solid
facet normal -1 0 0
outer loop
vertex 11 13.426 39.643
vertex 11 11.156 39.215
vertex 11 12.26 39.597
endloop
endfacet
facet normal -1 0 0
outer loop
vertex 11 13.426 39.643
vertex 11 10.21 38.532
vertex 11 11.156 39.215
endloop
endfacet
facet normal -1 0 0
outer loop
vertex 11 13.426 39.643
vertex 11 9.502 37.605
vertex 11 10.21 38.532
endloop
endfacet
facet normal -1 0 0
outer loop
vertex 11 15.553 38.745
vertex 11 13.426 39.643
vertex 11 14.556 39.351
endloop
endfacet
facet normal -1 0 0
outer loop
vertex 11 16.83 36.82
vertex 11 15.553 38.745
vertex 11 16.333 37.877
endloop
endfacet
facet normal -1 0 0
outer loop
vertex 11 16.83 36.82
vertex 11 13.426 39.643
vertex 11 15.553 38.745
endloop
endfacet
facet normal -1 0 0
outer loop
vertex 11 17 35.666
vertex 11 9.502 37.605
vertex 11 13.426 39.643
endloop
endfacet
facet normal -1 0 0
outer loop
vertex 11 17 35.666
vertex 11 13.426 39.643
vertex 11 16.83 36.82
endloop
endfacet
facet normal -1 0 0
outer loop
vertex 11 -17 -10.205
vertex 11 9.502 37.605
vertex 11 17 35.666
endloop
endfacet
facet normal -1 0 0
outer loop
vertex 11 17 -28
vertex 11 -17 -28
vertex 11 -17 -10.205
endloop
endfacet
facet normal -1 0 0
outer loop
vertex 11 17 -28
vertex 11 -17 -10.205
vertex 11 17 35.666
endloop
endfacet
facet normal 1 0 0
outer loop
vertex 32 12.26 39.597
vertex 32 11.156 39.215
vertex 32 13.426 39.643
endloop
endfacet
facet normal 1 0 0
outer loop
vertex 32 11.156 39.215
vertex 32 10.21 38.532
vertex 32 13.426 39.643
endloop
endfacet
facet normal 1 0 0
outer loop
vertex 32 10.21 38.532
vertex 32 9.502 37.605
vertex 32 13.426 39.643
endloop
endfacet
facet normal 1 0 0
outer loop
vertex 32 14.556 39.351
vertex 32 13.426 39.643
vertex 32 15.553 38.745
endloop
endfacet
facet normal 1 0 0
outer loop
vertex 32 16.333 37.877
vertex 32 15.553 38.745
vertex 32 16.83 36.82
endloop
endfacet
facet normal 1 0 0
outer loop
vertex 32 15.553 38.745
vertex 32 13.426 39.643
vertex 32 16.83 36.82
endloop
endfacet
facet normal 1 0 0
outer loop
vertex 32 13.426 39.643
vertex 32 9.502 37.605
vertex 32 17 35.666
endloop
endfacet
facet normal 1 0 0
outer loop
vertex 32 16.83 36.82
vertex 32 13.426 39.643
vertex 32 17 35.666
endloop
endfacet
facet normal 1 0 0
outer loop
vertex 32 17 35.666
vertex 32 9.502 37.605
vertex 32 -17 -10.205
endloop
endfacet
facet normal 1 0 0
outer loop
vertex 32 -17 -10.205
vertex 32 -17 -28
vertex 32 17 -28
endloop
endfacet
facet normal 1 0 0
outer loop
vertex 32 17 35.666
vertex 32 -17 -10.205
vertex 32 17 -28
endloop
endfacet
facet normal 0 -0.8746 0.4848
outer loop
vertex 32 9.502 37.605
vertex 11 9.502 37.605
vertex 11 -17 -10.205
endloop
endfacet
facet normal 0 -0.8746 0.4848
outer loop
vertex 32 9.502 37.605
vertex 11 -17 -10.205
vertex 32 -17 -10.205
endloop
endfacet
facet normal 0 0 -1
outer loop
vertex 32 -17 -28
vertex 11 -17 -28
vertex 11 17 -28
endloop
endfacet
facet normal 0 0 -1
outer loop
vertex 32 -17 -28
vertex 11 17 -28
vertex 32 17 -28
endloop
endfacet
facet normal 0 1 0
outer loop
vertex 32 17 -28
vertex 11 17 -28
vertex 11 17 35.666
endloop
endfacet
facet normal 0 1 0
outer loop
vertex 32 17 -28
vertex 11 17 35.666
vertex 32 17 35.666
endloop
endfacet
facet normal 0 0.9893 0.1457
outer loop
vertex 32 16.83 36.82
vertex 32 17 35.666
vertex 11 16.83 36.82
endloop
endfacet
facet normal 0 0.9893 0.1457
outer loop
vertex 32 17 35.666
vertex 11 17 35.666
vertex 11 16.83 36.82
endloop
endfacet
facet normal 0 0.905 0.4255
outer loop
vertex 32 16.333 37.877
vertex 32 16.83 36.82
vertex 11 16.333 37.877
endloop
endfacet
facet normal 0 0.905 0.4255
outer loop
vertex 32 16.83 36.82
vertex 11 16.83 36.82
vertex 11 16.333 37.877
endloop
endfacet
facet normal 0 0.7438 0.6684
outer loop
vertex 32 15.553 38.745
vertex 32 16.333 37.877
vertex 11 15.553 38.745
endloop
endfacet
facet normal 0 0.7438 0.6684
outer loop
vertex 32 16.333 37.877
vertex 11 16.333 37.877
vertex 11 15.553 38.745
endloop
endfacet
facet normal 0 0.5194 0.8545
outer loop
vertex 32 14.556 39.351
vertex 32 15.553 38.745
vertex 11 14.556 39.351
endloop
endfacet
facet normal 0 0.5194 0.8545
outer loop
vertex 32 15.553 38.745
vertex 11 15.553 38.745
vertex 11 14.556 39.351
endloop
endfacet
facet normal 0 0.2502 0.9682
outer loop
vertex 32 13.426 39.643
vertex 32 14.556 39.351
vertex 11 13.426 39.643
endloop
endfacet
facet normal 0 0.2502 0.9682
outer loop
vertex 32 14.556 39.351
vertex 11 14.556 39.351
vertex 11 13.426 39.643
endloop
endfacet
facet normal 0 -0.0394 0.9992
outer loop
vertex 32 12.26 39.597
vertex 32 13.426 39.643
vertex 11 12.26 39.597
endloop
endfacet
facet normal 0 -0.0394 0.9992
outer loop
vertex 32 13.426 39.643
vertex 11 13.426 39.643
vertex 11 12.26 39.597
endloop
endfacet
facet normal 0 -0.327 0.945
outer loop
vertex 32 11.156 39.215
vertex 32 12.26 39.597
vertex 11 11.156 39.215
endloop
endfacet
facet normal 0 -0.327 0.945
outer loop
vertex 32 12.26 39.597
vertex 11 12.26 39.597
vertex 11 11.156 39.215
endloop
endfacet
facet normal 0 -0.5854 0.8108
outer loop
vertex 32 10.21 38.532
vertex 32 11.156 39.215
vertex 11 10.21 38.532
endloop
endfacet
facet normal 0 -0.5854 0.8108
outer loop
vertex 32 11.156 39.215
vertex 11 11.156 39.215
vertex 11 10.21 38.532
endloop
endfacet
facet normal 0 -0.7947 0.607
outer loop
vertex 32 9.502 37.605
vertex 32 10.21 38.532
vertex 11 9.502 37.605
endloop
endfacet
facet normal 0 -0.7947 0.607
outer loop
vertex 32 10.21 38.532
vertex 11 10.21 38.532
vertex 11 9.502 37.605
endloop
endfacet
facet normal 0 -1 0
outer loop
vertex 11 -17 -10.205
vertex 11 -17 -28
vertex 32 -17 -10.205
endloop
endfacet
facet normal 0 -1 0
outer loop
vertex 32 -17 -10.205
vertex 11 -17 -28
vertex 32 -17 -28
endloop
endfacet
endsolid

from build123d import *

# Parameters (mm, degrees)
BOX112015002006_W          = 23
BOX112015002006_H          = 34
BOX112015002006_DEPTH      = 80
BOX112015002006_ROLL_ANGLE = -29
BOX112015002005_W          = 21
BOX112015002005_H          = 34
BOX112015002005_DEPTH      = 80
FILLET002_R                = 4


with BuildPart() as cube076:
    # Box112015002006 → Box112015002006 (new body)
    with BuildSketch(Plane.XY):
        with Locations((11.5, 17)):
            Rectangle(BOX112015002006_W, BOX112015002006_H)
    extrude(amount=BOX112015002006_DEPTH)


with BuildPart() as cube076_1:
    # Box112015002006 roll: moved
    add(cube076.part.rotate(Axis((0, 0, 0), (1, 0, 0)), BOX112015002006_ROLL_ANGLE))


with BuildPart() as cube076_2:
    # Box112015002006 placement: moved
    add(cube076_1.part.moved(Location((10, -48, -6))))


with BuildPart() as fillet002:
    # Box112015002005 → Box112015002005 (new body)
    with BuildSketch(Plane(origin=(11, -17, -38), x_dir=(1, 0, 0), z_dir=(0, 0, 1))):
        with Locations((10.5, 17)):
            Rectangle(BOX112015002005_W, BOX112015002005_H)
    extrude(amount=BOX112015002005_DEPTH)

    # Cut131: cut Cube076
    add(cube076_2.part, mode=Mode.SUBTRACT)

    # Fillet002
    fillet002_edges = [fillet002.edges().sort_by_distance(p)[0] for p in [
        (21.5, 17, 41.132483),
    ]]
    fillet(fillet002_edges, radius=FILLET002_R)


with BuildPart() as fillet002_1:
    # Fillet002 placement: moved
    add(fillet002.part.moved(Location((0, 0, 10))))


solid = fillet002_1.part
